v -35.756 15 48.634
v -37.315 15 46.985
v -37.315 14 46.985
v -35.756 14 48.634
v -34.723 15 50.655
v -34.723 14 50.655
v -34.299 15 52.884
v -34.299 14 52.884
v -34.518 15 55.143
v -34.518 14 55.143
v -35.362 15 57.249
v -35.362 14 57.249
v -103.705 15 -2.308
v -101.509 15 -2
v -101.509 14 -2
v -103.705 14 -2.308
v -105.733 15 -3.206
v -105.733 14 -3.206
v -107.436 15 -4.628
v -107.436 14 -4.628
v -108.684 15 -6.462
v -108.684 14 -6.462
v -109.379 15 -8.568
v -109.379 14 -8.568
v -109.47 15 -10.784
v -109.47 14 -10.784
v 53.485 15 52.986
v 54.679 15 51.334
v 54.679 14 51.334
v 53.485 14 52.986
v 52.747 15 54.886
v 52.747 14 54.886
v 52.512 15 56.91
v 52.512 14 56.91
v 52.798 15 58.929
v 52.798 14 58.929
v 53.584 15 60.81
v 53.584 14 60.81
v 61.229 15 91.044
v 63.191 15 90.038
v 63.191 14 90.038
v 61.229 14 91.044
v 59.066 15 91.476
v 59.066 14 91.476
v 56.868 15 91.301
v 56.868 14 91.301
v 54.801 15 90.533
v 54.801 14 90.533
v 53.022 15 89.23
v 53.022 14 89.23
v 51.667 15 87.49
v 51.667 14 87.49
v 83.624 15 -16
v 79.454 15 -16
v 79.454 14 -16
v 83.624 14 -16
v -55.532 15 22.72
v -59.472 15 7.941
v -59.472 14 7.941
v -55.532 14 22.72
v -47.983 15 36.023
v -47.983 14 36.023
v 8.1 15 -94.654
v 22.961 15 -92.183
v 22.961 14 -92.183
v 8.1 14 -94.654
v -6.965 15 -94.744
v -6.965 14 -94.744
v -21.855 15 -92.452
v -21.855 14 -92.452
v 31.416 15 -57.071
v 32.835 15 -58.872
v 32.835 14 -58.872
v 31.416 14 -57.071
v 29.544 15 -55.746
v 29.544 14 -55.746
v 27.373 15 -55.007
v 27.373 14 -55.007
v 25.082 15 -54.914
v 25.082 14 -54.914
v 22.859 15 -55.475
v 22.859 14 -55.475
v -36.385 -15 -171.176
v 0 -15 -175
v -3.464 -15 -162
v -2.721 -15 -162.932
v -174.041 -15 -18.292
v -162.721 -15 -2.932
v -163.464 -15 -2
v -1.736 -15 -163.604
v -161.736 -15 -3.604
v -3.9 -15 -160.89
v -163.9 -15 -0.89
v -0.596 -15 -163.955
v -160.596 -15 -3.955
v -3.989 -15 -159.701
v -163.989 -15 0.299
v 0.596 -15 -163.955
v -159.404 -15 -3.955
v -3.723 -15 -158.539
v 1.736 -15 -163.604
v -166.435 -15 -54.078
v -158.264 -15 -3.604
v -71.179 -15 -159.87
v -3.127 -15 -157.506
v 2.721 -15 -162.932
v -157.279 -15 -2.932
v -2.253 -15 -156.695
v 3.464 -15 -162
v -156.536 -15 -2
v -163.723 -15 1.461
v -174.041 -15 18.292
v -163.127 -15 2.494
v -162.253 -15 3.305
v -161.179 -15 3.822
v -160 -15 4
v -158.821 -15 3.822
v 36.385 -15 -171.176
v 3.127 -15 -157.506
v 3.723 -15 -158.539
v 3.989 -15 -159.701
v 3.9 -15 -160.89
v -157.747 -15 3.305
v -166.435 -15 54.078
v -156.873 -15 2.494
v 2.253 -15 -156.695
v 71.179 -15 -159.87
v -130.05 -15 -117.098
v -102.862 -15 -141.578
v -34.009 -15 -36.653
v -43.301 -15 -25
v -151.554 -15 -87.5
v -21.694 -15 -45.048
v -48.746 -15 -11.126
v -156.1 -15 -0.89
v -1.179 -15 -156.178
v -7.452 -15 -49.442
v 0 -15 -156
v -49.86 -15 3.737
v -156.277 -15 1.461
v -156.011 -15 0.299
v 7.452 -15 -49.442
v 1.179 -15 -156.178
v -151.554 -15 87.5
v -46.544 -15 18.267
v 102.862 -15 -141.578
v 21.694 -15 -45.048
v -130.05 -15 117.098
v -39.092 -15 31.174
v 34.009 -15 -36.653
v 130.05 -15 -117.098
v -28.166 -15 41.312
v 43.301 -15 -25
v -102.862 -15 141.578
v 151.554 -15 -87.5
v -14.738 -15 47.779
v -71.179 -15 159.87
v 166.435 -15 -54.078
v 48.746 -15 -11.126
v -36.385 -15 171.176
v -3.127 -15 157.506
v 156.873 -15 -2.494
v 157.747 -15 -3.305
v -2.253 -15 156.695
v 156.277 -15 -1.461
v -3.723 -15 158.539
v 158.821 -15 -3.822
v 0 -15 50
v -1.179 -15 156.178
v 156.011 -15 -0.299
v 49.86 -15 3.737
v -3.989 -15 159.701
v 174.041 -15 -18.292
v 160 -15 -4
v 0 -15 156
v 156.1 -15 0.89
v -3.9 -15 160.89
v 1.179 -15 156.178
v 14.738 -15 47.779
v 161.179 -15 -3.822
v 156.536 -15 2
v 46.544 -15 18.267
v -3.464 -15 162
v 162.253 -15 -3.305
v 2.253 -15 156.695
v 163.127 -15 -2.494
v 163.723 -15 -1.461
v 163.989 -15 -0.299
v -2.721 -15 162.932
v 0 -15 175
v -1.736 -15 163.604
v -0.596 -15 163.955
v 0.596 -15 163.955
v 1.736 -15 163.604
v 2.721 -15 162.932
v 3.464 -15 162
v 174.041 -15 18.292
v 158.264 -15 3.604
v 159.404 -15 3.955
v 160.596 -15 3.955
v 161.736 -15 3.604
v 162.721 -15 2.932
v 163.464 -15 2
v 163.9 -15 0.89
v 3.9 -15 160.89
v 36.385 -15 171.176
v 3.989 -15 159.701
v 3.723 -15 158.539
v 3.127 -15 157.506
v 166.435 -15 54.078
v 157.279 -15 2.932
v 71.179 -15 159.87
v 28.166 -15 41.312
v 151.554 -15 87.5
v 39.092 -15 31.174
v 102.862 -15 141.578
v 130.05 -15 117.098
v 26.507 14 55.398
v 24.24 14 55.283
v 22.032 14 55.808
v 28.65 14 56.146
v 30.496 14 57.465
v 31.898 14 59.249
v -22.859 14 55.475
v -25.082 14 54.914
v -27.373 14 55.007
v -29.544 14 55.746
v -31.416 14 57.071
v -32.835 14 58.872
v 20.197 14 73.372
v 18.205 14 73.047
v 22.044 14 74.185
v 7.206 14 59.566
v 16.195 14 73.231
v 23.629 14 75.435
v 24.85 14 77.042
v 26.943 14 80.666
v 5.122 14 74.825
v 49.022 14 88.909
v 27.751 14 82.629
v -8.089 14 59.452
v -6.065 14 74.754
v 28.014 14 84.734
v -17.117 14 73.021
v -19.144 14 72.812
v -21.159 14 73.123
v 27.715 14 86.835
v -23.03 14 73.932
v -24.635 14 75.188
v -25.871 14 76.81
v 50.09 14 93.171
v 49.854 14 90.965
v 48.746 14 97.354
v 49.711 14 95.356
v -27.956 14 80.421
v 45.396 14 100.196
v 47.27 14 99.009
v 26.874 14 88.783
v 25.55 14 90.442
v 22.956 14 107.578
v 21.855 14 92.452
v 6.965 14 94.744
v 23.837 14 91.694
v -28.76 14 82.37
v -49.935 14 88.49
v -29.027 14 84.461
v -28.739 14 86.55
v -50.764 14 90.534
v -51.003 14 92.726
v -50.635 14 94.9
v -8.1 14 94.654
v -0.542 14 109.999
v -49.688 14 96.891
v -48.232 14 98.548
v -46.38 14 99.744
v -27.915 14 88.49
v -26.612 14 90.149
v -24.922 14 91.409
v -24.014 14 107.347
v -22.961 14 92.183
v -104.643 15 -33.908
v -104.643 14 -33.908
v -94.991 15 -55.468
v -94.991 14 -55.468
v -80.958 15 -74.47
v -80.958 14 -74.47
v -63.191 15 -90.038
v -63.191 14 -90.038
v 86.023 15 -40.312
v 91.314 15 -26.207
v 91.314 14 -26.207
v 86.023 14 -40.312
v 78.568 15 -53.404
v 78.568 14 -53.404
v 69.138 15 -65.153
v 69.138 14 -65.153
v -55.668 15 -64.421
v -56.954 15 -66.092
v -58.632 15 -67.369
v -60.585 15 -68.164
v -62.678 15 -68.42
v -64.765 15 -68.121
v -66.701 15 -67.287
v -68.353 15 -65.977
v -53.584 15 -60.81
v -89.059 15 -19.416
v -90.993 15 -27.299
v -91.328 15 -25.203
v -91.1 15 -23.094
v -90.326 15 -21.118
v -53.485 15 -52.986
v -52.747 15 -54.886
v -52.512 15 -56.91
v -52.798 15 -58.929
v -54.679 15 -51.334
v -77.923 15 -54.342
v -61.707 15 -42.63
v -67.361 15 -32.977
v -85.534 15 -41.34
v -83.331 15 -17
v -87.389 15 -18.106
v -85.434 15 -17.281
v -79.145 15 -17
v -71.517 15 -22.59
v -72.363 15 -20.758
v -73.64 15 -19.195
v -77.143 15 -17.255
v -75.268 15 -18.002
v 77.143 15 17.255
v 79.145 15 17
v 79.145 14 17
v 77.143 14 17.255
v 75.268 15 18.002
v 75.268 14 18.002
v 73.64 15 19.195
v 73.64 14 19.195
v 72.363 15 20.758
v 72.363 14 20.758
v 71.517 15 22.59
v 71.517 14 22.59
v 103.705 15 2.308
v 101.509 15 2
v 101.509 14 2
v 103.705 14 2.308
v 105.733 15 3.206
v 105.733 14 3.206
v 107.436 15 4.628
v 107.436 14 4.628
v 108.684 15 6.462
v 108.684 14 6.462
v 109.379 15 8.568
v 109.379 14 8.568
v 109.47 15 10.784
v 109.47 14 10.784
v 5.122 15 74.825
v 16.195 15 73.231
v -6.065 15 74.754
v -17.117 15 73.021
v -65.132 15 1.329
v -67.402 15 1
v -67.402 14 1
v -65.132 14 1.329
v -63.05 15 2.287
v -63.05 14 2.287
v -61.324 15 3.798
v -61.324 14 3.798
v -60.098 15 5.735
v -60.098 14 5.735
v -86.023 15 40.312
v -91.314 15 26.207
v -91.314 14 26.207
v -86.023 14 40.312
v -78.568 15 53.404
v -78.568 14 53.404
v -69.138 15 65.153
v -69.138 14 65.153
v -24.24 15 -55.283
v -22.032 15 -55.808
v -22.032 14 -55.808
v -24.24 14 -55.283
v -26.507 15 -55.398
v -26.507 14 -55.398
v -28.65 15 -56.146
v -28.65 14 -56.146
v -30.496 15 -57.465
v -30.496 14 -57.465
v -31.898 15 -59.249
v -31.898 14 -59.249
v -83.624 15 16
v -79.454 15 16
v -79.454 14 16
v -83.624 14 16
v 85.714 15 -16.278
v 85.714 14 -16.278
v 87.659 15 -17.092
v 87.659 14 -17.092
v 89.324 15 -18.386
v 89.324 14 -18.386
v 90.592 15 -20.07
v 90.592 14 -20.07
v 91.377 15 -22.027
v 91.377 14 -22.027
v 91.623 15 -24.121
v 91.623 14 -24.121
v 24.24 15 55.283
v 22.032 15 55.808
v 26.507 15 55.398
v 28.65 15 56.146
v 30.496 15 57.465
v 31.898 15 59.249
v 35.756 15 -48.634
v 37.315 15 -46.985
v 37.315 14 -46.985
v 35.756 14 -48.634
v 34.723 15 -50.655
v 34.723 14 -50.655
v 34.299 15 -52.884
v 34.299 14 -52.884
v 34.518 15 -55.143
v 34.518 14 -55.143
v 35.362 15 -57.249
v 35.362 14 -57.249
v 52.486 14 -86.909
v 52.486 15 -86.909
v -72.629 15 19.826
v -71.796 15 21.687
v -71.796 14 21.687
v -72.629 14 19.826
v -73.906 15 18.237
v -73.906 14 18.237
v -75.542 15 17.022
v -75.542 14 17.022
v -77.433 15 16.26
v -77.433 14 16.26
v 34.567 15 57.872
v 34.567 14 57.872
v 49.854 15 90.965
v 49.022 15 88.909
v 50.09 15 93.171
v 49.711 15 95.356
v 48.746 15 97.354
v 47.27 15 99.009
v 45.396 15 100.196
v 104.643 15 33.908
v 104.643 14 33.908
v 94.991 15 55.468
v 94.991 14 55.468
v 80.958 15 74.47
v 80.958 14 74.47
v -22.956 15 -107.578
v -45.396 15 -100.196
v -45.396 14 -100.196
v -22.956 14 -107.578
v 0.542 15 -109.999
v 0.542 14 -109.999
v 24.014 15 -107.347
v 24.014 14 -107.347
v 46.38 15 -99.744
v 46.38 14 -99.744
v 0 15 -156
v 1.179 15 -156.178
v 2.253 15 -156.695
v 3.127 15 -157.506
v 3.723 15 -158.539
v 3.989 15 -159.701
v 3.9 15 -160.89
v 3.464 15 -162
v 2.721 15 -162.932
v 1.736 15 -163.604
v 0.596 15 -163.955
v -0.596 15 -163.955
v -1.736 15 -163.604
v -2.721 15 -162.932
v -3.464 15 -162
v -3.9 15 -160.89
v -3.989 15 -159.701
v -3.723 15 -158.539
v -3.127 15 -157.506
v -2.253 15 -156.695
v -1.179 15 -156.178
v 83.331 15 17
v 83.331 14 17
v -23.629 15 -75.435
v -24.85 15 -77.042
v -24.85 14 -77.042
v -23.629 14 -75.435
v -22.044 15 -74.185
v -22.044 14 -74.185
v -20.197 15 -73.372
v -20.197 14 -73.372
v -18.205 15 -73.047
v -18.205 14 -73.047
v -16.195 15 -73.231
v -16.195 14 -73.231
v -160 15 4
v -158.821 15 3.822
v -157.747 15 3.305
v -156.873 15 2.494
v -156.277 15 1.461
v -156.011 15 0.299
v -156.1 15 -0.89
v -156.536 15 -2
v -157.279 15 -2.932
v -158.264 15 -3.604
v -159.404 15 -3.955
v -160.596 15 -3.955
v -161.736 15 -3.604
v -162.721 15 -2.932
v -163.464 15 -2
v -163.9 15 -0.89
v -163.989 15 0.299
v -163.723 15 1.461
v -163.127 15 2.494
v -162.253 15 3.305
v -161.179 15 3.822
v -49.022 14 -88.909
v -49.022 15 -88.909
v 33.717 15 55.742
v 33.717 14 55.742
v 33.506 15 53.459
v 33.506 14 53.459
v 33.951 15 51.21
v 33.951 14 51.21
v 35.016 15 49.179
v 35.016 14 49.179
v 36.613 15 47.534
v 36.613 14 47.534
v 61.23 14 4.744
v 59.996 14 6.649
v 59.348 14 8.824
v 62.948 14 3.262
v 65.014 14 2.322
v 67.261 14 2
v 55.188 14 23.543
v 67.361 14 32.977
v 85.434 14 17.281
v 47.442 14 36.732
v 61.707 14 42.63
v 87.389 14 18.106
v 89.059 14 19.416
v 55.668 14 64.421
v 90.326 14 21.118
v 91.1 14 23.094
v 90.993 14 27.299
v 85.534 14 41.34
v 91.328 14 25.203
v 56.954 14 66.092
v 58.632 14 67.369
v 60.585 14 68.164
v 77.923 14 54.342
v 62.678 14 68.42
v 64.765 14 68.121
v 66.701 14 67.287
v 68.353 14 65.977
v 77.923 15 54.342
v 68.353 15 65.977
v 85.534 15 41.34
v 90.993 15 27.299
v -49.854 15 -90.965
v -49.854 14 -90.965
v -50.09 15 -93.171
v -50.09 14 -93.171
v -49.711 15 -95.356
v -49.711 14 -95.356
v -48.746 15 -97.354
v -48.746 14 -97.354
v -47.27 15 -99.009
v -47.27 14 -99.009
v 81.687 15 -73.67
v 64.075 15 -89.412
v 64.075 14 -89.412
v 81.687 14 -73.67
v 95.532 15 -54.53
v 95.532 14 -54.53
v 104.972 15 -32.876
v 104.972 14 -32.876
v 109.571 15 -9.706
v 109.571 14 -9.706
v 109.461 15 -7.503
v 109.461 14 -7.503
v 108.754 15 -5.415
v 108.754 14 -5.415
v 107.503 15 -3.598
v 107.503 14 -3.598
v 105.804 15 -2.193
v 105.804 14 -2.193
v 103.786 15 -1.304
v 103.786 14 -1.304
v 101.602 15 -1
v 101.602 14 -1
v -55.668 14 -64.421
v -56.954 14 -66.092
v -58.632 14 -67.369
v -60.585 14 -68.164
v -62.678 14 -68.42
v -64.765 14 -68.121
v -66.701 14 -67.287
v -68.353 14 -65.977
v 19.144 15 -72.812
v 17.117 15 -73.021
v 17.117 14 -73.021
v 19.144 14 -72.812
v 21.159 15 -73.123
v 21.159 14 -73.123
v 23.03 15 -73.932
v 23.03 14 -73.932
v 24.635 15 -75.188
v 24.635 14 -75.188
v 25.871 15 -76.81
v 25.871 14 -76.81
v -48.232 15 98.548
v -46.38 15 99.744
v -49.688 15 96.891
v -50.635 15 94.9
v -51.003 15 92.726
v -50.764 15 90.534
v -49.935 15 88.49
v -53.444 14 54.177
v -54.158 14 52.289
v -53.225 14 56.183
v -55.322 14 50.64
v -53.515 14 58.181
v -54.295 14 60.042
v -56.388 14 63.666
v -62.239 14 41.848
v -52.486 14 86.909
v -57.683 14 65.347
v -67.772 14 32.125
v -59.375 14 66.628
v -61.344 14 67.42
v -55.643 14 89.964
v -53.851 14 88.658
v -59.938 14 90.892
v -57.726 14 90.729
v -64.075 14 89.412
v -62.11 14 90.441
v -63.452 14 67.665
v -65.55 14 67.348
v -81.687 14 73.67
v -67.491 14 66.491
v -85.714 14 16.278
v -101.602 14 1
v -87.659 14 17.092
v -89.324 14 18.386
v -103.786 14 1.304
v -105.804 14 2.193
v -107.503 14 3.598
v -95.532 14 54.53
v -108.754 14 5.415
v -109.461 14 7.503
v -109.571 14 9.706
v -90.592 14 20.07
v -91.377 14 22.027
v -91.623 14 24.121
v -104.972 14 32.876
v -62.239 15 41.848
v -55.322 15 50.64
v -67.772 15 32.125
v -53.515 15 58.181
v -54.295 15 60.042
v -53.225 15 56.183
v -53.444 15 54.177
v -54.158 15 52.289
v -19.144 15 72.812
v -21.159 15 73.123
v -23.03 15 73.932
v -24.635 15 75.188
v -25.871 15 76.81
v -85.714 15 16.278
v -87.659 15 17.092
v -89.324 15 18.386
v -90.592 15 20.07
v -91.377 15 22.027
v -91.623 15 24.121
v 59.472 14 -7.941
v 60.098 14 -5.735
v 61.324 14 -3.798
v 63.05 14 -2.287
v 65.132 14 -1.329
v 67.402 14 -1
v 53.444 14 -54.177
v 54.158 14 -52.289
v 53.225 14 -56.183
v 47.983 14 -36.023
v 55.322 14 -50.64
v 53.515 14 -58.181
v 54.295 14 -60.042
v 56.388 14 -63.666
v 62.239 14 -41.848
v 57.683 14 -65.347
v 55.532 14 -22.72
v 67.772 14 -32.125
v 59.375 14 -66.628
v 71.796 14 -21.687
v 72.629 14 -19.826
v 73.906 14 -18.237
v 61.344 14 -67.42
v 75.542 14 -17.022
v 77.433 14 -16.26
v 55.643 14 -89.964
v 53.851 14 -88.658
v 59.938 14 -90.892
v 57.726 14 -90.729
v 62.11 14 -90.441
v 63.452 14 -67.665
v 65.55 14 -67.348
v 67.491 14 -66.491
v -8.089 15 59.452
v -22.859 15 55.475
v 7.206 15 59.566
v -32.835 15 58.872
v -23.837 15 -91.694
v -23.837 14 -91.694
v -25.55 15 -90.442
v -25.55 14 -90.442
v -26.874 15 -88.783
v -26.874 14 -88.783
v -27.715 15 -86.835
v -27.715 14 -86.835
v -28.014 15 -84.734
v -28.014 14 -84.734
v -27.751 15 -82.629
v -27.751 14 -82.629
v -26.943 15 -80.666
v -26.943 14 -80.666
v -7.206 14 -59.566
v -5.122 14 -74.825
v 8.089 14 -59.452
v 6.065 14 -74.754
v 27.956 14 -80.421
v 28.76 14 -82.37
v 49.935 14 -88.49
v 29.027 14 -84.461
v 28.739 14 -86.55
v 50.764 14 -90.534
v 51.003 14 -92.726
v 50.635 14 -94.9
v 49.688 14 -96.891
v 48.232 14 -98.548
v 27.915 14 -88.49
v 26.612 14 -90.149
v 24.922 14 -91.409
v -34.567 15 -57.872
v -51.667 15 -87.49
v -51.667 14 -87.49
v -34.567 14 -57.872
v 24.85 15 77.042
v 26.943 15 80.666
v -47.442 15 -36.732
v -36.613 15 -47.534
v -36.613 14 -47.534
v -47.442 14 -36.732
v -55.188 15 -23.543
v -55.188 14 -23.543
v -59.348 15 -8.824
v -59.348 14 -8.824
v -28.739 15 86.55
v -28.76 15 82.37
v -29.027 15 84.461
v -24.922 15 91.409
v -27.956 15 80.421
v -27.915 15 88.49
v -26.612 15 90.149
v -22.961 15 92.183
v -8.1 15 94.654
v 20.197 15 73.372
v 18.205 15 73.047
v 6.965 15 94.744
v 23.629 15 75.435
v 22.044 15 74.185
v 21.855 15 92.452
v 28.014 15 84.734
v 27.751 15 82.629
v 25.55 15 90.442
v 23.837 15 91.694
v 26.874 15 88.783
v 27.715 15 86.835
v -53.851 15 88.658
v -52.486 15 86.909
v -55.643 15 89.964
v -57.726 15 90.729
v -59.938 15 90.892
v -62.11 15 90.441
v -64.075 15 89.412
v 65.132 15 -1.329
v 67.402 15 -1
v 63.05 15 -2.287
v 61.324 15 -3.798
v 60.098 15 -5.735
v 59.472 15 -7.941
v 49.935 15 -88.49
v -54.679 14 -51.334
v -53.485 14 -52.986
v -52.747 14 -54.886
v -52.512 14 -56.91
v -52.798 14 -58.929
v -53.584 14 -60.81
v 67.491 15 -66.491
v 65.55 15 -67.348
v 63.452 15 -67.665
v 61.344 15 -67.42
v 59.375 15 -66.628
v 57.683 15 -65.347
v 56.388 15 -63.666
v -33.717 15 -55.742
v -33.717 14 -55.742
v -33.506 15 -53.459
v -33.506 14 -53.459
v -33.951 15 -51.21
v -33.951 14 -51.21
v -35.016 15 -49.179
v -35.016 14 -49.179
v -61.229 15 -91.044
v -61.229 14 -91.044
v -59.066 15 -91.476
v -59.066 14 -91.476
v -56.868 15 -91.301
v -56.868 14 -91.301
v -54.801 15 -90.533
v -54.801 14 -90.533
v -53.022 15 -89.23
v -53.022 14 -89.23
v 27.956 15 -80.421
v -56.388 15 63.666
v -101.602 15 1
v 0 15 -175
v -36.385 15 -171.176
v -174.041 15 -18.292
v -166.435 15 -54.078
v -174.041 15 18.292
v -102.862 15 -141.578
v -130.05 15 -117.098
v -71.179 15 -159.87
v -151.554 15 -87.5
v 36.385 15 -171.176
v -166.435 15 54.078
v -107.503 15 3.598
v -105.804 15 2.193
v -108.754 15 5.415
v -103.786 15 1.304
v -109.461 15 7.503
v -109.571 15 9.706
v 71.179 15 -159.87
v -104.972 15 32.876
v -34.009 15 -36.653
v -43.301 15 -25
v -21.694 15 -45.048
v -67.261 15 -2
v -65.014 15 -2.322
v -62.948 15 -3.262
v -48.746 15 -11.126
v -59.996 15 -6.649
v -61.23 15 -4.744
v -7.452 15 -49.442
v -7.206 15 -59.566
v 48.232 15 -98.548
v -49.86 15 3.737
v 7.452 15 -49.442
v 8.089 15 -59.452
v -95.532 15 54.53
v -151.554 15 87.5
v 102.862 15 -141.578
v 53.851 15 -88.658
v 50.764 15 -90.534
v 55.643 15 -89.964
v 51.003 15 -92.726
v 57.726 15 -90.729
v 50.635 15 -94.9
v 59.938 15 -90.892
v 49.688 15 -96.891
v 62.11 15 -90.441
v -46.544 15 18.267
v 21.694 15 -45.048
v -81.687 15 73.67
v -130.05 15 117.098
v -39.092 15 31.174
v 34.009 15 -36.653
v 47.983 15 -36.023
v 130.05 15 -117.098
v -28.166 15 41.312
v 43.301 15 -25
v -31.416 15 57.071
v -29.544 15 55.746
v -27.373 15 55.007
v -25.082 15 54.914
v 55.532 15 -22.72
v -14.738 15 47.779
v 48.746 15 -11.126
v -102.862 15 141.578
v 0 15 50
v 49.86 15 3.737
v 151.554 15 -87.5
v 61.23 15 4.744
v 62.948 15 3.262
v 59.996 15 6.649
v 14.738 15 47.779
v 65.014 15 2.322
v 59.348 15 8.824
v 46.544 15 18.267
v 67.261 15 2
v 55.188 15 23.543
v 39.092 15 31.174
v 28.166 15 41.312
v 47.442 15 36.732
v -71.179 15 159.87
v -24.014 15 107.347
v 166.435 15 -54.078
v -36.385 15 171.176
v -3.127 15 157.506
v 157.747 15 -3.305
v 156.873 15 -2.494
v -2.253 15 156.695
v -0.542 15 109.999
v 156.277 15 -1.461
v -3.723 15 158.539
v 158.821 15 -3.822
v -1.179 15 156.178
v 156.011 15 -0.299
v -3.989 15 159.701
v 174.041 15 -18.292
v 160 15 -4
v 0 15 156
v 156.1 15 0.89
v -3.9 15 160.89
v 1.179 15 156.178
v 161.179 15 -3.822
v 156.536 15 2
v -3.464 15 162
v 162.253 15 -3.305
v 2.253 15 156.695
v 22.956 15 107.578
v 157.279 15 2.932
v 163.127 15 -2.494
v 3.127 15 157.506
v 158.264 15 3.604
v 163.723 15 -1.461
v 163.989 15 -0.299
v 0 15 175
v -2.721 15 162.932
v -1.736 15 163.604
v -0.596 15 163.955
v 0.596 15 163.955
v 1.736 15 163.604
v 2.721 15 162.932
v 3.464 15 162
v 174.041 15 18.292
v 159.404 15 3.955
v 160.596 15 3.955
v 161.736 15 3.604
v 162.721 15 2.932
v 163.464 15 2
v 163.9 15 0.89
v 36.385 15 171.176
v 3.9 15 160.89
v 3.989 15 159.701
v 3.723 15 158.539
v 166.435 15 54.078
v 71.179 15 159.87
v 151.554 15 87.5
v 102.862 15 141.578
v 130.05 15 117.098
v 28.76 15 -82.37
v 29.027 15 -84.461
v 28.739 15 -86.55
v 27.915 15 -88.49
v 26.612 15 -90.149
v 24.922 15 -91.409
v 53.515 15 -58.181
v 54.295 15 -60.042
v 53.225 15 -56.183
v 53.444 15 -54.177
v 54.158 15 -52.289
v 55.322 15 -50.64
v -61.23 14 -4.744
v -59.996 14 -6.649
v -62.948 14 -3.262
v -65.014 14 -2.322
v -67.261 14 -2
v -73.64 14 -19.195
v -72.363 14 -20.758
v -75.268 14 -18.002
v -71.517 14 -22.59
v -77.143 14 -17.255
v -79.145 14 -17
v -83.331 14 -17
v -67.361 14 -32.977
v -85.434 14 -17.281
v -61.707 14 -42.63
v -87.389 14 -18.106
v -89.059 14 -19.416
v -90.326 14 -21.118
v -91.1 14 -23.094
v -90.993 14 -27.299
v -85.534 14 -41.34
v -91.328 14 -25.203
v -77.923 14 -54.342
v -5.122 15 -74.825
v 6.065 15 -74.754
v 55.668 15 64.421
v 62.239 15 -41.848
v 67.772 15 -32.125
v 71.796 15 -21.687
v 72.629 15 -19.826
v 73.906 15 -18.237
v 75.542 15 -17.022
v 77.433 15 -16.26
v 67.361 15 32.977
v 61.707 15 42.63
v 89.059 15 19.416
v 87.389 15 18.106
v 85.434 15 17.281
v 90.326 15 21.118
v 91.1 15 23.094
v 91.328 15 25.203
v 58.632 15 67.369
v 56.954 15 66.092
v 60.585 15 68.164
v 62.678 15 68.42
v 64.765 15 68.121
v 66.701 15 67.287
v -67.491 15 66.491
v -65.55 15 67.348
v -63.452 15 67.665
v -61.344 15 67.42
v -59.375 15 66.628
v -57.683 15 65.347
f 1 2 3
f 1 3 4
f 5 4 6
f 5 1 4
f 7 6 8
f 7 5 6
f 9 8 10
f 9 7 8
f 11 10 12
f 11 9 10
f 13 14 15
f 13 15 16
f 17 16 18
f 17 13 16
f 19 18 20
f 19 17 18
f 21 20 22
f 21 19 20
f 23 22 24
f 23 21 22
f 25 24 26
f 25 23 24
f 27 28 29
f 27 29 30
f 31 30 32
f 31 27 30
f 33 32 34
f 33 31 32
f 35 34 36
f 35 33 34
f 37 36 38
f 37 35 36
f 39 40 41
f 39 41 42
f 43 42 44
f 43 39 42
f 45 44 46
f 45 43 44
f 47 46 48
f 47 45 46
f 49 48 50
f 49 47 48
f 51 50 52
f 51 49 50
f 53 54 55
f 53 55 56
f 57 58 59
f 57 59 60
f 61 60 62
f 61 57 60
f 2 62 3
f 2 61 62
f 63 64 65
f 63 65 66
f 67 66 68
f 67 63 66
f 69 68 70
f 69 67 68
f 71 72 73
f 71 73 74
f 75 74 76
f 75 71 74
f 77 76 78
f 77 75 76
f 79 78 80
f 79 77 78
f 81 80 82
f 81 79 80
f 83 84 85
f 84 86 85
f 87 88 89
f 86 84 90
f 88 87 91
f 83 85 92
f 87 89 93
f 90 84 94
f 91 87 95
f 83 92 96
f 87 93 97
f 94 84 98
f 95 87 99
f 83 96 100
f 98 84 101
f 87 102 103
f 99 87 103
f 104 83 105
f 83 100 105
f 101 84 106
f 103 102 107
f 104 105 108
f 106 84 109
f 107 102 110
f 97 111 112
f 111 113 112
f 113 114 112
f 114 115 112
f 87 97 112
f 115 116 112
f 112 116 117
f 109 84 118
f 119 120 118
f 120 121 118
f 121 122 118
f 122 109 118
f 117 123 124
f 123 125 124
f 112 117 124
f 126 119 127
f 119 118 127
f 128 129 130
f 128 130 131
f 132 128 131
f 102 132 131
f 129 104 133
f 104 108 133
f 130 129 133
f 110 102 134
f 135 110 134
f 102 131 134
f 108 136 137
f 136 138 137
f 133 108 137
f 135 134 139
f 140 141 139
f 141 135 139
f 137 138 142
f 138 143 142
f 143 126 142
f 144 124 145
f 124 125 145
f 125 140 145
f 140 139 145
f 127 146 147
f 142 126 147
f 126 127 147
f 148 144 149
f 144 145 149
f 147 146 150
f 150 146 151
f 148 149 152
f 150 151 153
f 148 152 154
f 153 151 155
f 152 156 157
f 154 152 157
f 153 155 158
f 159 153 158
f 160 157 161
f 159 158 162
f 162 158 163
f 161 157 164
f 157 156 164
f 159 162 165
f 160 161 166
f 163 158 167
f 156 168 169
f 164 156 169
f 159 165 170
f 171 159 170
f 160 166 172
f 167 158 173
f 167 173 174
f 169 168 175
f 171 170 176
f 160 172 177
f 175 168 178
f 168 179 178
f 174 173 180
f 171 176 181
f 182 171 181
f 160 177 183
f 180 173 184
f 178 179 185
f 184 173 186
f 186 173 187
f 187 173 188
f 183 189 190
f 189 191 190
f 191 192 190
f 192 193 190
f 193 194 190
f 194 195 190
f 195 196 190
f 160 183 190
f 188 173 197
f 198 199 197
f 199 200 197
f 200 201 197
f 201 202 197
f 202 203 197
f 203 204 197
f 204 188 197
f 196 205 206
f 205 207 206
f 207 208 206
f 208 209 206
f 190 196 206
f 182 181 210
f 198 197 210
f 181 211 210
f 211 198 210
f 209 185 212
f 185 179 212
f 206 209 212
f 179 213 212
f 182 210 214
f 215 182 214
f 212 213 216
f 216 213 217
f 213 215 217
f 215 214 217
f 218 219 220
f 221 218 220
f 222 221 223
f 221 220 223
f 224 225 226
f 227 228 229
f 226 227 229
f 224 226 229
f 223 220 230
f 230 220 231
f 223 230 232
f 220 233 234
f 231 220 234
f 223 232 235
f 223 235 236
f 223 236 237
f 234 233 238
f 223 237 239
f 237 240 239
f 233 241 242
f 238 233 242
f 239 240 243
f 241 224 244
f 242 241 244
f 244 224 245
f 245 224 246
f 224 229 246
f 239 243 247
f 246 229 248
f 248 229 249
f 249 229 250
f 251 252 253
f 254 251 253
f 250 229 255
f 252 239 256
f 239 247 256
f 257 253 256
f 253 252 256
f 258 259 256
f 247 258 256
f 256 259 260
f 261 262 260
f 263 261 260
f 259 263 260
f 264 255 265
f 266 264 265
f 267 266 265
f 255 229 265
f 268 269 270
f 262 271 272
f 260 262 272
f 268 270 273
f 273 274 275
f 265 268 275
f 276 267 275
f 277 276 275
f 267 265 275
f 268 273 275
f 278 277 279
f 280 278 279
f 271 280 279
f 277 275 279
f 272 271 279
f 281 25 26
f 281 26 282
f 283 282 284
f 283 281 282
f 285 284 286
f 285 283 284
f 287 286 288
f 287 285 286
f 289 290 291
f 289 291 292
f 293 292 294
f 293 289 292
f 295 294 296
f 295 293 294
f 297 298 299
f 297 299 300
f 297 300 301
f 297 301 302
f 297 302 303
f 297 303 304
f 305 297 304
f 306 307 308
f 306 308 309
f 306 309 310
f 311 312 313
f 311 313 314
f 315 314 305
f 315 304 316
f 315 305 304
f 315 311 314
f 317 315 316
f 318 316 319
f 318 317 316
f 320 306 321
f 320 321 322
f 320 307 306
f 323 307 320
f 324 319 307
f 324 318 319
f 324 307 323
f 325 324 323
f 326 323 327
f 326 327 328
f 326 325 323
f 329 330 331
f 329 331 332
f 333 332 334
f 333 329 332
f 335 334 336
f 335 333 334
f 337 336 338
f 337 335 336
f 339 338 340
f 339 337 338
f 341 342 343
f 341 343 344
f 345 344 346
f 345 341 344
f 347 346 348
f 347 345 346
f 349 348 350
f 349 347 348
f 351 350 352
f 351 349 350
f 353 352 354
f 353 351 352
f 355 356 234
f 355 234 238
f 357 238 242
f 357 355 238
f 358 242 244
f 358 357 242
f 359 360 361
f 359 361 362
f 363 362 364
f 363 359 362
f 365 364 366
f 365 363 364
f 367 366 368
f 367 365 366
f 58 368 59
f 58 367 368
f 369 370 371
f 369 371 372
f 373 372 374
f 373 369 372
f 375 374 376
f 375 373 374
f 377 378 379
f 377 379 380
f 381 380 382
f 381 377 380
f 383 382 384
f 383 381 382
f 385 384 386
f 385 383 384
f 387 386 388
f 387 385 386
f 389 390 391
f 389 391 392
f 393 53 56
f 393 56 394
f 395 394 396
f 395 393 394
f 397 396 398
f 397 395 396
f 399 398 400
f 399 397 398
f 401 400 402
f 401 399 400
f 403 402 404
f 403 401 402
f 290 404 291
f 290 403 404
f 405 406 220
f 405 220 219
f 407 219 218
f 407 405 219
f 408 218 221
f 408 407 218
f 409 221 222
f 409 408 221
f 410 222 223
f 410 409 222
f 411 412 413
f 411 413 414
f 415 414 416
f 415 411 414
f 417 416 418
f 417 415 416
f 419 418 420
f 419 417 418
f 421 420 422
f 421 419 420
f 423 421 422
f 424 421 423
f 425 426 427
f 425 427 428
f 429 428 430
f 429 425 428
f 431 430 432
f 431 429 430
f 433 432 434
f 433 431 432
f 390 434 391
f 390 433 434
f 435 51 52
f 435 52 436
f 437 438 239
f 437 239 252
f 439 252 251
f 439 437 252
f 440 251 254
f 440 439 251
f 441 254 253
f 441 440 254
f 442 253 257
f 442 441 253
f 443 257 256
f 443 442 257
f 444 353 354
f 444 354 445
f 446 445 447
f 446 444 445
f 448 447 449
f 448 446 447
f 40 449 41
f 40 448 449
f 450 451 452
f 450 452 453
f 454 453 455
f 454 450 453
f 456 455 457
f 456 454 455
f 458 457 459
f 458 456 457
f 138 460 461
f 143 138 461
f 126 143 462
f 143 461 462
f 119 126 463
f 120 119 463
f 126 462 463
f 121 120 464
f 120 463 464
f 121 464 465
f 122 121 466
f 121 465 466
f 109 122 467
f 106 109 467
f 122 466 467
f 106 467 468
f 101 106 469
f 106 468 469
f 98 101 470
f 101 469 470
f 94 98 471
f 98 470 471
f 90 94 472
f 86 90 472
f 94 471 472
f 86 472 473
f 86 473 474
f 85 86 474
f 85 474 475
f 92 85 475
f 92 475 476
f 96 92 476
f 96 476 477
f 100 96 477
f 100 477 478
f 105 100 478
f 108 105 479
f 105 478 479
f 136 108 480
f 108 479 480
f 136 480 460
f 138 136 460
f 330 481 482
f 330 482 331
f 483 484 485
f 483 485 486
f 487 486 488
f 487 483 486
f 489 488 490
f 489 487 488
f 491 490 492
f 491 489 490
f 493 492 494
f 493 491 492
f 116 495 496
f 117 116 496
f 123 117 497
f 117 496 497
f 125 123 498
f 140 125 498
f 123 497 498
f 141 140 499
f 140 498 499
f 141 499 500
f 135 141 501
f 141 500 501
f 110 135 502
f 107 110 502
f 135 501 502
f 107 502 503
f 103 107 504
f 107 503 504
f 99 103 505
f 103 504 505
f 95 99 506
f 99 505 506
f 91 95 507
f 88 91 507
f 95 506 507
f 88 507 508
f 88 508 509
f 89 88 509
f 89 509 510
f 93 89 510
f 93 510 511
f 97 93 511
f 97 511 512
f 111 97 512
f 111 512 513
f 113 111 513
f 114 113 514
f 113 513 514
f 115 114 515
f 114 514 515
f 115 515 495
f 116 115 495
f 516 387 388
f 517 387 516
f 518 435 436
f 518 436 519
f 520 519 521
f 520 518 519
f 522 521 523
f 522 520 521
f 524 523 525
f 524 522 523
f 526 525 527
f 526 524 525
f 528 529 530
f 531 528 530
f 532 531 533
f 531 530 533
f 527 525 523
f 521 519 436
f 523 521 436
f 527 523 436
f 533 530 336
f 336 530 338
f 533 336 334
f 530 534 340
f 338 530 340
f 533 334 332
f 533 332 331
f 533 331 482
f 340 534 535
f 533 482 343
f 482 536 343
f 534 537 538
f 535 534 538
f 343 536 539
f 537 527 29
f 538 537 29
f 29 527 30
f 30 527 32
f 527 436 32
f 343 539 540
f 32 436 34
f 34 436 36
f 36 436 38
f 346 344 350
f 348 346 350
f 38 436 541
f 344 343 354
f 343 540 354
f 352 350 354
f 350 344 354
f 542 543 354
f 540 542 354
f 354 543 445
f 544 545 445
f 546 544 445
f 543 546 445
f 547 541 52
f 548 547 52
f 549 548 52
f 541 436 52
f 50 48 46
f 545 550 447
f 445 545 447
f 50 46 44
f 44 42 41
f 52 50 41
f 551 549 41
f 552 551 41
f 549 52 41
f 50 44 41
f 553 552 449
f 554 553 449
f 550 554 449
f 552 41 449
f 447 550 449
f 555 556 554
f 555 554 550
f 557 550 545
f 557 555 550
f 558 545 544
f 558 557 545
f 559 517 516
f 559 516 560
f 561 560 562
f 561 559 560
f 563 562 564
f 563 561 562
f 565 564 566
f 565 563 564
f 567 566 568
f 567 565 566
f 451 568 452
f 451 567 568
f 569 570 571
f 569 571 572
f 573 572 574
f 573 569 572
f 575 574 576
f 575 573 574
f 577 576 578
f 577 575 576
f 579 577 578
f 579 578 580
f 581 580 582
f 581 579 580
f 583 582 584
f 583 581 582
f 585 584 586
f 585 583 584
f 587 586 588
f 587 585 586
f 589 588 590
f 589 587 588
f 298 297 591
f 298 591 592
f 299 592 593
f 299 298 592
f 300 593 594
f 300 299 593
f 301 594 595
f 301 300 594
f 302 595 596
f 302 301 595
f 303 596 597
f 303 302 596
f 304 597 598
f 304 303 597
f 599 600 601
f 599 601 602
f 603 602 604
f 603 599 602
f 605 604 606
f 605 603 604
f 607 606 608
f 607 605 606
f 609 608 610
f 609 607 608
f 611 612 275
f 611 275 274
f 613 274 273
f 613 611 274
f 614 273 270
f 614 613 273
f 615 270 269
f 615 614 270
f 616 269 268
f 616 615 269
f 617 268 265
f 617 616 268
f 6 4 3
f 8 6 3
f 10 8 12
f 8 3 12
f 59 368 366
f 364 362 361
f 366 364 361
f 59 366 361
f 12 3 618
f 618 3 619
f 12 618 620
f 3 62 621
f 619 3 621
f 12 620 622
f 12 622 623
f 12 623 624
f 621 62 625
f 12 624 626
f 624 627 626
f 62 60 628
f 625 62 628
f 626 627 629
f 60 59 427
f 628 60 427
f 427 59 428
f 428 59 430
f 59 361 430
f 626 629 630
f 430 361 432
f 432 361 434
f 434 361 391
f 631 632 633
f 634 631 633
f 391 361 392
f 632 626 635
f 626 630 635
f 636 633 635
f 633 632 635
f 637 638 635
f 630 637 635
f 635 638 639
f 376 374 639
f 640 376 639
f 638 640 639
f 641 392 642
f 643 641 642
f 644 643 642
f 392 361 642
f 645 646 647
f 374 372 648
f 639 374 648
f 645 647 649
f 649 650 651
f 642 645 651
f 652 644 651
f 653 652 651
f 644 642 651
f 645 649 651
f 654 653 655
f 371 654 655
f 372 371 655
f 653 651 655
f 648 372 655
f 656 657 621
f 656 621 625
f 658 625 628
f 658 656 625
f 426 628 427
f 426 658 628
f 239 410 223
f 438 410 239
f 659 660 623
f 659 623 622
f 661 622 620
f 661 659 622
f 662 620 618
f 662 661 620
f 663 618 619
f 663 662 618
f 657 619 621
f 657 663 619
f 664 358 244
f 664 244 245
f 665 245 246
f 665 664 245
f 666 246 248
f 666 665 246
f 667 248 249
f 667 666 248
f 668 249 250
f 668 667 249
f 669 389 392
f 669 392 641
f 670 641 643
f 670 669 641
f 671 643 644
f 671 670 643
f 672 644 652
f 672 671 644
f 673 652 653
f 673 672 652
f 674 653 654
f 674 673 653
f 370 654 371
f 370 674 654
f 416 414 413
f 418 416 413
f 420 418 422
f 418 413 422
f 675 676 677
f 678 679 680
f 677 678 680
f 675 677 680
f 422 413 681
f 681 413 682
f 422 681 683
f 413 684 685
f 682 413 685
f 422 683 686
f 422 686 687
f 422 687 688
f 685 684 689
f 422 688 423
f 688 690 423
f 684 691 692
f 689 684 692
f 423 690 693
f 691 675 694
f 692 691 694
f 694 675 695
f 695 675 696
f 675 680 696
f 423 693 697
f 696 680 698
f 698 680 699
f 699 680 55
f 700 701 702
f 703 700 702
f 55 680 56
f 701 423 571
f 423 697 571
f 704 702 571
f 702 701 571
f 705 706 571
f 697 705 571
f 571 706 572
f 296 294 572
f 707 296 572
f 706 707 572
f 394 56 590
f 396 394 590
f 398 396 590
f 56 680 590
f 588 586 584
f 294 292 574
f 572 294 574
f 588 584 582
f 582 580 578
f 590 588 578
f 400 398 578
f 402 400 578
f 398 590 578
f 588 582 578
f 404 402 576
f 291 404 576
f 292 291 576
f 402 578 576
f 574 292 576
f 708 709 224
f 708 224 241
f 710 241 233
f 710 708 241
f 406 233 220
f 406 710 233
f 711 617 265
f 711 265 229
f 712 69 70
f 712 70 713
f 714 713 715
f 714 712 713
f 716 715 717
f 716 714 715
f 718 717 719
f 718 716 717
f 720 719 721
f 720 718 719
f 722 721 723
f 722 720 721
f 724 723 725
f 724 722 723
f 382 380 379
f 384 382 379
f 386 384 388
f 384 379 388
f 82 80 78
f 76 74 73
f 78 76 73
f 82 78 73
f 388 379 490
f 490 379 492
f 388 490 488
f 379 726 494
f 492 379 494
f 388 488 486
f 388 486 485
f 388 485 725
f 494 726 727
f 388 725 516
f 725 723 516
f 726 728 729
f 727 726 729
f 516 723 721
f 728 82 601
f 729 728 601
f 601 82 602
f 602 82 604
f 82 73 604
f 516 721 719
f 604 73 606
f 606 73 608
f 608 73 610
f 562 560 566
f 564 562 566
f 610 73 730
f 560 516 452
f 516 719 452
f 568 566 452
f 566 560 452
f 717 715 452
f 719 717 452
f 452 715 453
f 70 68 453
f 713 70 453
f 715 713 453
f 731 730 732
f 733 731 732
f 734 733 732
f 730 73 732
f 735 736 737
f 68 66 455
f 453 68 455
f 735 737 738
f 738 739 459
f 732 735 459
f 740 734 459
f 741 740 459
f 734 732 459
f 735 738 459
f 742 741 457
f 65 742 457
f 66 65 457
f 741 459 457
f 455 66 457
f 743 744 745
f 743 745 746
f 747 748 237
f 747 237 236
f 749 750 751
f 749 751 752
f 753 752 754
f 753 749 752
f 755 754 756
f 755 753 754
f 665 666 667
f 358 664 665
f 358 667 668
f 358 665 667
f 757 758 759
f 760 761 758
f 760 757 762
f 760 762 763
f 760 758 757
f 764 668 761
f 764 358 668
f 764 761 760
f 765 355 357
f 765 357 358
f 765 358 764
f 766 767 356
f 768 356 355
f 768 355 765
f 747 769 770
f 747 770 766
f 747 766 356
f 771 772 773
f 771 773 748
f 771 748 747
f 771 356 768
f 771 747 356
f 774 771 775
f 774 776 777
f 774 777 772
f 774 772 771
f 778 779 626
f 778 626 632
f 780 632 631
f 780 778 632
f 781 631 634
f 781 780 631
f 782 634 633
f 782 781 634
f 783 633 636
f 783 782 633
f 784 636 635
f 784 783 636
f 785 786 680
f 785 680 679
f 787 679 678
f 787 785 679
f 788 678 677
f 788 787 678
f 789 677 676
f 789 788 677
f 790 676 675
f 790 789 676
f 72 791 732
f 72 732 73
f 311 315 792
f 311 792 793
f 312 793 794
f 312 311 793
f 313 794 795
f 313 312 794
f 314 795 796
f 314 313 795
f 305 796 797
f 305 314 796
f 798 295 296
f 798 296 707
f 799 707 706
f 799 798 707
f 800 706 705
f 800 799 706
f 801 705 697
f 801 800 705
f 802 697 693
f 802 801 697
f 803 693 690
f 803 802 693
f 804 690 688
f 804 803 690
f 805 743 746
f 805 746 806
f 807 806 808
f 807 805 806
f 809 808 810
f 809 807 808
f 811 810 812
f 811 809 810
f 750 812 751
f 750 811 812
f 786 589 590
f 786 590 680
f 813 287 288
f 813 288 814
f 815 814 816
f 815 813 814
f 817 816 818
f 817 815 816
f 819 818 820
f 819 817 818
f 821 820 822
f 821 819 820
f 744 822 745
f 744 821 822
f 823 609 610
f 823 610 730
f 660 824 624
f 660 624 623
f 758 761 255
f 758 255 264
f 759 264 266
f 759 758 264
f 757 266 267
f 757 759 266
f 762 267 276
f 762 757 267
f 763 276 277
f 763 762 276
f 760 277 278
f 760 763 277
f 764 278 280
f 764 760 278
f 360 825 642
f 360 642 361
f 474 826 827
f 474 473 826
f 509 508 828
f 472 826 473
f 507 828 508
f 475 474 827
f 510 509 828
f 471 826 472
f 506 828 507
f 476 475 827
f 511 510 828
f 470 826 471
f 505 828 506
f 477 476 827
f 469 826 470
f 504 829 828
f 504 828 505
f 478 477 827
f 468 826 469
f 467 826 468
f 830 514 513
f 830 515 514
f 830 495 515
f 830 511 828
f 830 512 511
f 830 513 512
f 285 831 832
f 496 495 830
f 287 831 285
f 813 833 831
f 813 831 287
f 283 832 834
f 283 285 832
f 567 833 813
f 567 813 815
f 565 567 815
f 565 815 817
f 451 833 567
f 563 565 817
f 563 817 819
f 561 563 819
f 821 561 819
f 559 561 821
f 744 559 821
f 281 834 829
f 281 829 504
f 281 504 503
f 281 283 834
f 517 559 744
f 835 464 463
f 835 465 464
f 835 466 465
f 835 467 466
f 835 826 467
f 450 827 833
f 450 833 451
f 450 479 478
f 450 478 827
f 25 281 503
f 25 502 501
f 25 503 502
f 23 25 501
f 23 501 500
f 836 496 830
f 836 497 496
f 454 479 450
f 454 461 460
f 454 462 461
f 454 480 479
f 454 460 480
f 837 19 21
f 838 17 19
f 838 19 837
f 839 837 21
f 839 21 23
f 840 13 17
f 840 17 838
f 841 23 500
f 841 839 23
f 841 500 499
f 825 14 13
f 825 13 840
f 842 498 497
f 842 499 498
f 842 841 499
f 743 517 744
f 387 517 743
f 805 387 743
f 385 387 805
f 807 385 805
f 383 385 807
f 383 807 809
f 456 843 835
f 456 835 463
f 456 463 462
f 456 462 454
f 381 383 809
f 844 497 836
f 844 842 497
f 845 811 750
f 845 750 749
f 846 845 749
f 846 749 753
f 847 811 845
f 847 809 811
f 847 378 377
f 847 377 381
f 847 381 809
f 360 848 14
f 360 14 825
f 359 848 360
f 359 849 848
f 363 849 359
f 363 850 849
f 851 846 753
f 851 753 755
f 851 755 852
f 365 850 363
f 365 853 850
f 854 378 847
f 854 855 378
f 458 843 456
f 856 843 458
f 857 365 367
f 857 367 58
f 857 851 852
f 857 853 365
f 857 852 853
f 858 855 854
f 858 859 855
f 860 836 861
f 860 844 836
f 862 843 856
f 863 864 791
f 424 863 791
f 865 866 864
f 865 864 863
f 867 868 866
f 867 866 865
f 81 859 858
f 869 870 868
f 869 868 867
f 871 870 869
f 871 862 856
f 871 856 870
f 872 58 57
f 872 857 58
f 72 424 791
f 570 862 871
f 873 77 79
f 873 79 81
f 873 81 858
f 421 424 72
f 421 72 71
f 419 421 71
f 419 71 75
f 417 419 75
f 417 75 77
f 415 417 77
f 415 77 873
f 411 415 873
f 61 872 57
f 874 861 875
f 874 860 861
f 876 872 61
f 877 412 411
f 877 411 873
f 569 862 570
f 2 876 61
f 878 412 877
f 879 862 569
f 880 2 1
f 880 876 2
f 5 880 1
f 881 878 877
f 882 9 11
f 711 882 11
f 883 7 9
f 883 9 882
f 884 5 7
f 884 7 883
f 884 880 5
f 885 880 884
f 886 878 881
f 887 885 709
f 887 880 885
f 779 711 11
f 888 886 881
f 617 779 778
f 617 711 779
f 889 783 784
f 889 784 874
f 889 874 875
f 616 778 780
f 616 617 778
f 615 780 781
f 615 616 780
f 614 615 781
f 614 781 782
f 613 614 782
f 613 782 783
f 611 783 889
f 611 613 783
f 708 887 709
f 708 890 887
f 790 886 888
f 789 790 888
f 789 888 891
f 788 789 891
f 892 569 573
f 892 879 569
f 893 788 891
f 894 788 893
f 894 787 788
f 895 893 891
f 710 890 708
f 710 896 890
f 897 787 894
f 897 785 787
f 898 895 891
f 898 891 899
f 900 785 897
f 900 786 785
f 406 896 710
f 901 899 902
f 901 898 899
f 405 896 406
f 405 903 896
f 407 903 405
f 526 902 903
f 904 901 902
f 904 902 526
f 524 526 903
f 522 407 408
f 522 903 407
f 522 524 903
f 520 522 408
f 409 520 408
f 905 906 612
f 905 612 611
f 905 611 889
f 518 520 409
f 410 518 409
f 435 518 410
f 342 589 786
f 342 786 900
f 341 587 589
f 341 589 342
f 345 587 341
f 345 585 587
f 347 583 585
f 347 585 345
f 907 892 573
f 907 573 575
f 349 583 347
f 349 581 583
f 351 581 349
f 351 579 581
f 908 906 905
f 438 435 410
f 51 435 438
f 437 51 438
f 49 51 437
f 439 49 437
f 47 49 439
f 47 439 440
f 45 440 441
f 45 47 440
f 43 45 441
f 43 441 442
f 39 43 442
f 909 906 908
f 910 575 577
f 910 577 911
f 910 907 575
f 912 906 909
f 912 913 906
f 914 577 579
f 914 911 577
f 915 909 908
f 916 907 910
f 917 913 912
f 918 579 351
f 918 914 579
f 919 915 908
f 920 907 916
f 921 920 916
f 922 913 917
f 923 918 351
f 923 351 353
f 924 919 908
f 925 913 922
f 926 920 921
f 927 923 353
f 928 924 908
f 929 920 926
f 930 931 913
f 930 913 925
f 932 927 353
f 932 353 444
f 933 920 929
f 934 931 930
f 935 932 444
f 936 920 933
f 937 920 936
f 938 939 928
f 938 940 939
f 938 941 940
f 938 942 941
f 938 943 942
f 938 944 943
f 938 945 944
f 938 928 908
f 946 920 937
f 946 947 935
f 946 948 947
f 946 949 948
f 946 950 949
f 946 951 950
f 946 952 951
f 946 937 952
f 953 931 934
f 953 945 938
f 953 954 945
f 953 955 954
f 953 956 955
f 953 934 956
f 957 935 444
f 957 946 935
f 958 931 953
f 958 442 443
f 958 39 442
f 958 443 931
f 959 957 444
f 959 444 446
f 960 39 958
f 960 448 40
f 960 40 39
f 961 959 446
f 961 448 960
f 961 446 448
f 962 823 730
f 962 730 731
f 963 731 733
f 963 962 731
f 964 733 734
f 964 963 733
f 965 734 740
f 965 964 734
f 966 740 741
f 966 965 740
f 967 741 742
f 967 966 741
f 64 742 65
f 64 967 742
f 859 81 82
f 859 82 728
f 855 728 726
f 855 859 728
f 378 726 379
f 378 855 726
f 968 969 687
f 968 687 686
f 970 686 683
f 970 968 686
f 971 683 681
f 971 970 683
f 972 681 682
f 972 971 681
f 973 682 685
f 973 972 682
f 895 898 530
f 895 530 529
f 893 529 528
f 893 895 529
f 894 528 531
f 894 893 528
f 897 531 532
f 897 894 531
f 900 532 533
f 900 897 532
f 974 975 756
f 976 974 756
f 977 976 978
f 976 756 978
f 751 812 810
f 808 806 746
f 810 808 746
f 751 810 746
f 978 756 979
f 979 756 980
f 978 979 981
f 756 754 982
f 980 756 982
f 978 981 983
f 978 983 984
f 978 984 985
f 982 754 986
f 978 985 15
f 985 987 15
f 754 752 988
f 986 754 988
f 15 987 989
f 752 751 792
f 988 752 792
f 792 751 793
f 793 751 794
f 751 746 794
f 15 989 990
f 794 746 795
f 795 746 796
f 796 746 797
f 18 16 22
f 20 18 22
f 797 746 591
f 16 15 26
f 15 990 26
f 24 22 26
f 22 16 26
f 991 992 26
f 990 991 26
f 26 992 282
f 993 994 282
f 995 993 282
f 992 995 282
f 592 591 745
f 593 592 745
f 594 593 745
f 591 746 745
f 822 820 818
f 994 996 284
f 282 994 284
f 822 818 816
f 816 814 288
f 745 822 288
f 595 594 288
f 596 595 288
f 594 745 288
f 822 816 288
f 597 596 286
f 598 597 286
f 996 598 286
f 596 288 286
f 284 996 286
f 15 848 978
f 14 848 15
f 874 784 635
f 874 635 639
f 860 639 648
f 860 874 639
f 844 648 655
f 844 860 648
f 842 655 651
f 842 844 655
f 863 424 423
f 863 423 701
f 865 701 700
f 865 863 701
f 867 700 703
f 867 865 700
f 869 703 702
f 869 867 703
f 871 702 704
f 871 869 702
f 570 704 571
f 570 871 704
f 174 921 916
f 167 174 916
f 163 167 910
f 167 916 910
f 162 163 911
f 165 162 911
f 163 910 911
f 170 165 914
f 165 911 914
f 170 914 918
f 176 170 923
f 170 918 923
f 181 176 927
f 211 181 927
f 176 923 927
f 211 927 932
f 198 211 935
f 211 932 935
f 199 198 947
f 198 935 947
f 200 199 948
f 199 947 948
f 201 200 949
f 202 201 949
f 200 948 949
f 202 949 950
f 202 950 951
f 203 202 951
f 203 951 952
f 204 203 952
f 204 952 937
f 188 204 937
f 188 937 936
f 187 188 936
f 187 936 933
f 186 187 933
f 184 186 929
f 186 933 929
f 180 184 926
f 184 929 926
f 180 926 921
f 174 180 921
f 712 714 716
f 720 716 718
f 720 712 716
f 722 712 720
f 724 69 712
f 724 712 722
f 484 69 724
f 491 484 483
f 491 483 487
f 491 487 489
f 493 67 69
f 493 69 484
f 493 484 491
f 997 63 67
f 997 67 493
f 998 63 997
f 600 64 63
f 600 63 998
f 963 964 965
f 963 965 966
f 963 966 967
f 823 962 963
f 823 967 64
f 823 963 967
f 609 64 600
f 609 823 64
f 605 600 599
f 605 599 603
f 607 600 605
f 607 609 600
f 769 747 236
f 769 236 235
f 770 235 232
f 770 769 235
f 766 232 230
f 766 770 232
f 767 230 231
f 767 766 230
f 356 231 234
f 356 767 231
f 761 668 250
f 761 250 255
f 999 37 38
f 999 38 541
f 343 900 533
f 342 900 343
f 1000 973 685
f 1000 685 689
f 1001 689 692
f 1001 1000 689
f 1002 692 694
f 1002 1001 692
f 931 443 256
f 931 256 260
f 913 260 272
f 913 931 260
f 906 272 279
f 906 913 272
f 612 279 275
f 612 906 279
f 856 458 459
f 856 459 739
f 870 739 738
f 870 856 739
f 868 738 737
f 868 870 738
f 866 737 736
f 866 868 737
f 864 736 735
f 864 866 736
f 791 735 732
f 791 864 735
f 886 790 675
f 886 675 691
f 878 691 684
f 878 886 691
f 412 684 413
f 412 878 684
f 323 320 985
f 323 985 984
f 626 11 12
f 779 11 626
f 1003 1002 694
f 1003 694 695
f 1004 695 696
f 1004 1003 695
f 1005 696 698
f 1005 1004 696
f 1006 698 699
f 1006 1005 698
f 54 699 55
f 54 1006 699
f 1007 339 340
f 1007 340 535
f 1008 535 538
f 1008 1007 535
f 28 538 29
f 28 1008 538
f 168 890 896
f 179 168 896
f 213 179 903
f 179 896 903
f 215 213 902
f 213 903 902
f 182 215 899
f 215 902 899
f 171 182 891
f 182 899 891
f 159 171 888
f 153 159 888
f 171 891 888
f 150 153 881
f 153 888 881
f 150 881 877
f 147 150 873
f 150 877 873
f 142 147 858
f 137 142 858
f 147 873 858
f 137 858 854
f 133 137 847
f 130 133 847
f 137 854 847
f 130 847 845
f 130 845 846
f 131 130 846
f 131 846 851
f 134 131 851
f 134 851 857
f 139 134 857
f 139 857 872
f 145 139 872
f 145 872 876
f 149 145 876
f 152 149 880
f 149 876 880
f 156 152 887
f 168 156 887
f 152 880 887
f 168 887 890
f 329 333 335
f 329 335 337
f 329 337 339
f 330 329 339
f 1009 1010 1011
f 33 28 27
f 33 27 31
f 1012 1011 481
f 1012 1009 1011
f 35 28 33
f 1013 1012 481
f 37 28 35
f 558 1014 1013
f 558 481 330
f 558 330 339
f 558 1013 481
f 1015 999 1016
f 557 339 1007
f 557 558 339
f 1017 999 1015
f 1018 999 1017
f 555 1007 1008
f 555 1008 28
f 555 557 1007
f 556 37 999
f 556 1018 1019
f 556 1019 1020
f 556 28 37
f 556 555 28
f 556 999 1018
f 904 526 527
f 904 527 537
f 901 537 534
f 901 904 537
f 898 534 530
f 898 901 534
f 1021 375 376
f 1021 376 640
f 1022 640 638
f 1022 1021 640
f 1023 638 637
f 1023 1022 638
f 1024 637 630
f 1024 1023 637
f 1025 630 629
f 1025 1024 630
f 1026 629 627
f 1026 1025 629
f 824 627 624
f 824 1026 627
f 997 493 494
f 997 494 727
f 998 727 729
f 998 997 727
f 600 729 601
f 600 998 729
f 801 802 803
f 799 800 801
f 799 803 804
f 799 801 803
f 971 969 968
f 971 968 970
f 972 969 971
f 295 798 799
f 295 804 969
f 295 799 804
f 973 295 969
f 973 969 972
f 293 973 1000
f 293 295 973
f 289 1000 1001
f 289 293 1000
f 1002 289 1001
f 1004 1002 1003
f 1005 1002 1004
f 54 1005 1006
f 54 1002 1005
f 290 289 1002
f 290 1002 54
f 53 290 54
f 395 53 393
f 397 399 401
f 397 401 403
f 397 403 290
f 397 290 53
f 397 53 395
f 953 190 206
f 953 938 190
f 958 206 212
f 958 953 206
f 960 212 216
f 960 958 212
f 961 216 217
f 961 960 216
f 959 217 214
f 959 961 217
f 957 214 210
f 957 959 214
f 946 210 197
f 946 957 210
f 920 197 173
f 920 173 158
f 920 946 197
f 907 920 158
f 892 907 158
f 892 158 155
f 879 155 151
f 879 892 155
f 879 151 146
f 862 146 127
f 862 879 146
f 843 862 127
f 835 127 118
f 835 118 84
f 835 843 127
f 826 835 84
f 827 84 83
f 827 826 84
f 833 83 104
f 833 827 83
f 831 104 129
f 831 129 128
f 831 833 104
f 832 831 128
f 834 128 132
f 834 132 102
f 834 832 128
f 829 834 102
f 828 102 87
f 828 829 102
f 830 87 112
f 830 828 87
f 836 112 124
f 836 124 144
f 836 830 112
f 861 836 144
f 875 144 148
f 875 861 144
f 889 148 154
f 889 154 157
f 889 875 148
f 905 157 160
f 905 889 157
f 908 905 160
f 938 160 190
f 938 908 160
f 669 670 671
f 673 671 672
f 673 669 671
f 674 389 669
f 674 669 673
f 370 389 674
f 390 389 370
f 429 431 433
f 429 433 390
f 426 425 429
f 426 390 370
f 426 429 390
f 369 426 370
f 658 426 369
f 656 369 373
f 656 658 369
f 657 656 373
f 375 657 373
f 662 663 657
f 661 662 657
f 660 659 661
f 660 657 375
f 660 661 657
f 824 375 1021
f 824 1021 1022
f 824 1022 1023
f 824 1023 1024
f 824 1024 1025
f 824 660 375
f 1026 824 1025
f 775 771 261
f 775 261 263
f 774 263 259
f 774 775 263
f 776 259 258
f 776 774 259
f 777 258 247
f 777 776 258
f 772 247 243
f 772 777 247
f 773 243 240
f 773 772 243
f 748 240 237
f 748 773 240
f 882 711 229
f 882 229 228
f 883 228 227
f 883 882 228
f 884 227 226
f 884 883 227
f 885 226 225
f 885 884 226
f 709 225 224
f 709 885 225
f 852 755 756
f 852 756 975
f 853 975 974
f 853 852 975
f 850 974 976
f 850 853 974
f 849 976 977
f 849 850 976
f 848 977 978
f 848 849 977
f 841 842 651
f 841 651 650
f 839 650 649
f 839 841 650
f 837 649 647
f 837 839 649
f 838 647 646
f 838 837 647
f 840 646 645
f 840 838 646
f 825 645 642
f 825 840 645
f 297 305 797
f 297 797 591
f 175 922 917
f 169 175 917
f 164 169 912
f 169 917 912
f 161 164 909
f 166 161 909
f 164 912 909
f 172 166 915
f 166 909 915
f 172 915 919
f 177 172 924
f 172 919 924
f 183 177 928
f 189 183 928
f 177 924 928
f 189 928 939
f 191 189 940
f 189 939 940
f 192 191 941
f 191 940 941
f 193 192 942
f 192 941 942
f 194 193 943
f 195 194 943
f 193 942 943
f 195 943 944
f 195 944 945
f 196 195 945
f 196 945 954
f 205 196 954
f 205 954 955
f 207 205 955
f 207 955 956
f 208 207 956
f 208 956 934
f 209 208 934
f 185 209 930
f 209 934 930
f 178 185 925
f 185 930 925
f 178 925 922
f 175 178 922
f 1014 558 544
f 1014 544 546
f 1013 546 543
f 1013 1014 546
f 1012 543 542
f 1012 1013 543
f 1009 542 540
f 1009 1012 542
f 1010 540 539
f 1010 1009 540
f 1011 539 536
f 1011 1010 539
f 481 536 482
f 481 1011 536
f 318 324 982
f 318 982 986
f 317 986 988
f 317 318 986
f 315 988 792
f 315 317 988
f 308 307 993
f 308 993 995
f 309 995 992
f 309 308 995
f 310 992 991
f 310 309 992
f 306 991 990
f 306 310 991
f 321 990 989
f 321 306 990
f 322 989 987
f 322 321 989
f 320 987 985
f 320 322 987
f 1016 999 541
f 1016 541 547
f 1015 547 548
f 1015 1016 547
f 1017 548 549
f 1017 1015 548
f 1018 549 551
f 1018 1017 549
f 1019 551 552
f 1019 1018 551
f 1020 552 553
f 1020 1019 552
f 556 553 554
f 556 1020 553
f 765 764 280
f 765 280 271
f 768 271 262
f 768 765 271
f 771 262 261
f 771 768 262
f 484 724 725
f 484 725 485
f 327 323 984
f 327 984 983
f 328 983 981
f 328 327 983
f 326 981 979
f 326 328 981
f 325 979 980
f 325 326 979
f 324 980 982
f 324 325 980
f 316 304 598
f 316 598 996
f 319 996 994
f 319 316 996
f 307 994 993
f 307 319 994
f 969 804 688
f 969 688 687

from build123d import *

# Parameters (mm, degrees)
SKETCH2_R           = 175
BOSS_EXTRUDE1_DEPTH = 15
SKETCH3_R           = 4
SKETCH3_R_2         = 50
CUT_EXTRUDE1_DEPTH  = 30
CUT_EXTRUDE3_DEPTH  = 1
CIRPATTERN2_COUNT   = 6


with BuildPart() as part:
    # Sketch2 → Boss-Extrude1 (new, symmetric)
    with BuildSketch(Plane(origin=(0, 0, 0), x_dir=(1, 0, 0), z_dir=(0, 1, 0))):
        with Locations(Location((0, 0, 0), (0, 0, 270))):
            Circle(SKETCH2_R)
    extrude(amount=BOSS_EXTRUDE1_DEPTH, both=True)

    # Sketch3 → Cut-Extrude1 (cut)
    with BuildSketch(Plane(origin=(0, 15, 0), x_dir=(1, 0, 0), z_dir=(0, 1, 0))):
        with Locations(Location((0, 160, 0), (0, 0, 270))):
            Circle(SKETCH3_R)
        with Locations(Location((0, -160, 0), (0, 0, 90))):
            Circle(SKETCH3_R)
        with Locations(Location((-160, 0, 0), (0, 0, 270))):
            Circle(SKETCH3_R)
        with Locations(Location((160, 0, 0), (0, 0, 90))):
            Circle(SKETCH3_R)
        with Locations(Location((0, 0, 0), (0, 0, 270))):
            Circle(SKETCH3_R_2)
    extrude(amount=-CUT_EXTRUDE1_DEPTH, mode=Mode.SUBTRACT)

    # Sketch4 → Cut-Extrude3 (cut)
    with BuildSketch(Plane(origin=(0, 15, 0), x_dir=(1, 0, 0), z_dir=(0, 1, 0))):
        with BuildLine():
            ThreePointArc((-36.613340144, 47.533812423), (-51.737318493, 30.385027154), (-59.347664897, 8.823529412))
            ThreePointArc((-59.347664897, 8.823529412), (-62.036309634, 3.941462028), (-67.260686883, 2))
            Line((-67.260686883, 2), (-101.508620324, 2))
            ThreePointArc((-101.508620324, 2), (-107.436288913, 4.627594105), (-109.470080741, 10.784313725))
            ThreePointArc((-109.470080741, 10.784313725), (-94.99085495, 55.468346611), (-63.19102199, 90.038295963))
            ThreePointArc((-63.19102199, 90.038295963), (-56.868026794, 91.301361412), (-51.667108069, 87.490056256))
            Line((-51.667108069, 87.490056256), (-34.5669156, 57.87165408))
            ThreePointArc((-34.5669156, 57.87165408), (-33.647401917, 52.31816148), (-36.613340144, 47.533812423))
        make_face()
        with BuildLine():
            ThreePointArc((-55.668486055, 64.420646227), (-61.622662682, 68.361129347), (-68.352706691, 65.97656772))
            ThreePointArc((-68.352706691, 65.97656772), (-81.986434608, 47.991921614), (-90.993256658, 27.298850575))
            ThreePointArc((-90.993256658, 27.298850575), (-89.749031081, 20.224584028), (-83.330666624, 17))
            Line((-83.330666624, 17), (-79.14543575, 17))
            ThreePointArc((-79.14543575, 17), (-74.41664671, 18.547205705), (-71.516960015, 22.590361446))
            ThreePointArc((-71.516960015, 22.590361446), (-64.714174788, 37.908779742), (-54.679341331, 51.333903335))
            ThreePointArc((-54.679341331, 51.333903335), (-52.564762349, 55.890540621), (-53.583601177, 60.80951969))
            Line((-53.583601177, 60.80951969), (-55.668486055, 64.420646227))
        make_face(mode=Mode.SUBTRACT)
    cut_extrude3 = extrude(amount=-CUT_EXTRUDE3_DEPTH, mode=Mode.SUBTRACT)

    # CirPattern2: Cut-Extrude3 ×6 about axis
    cirpattern2_axis = Axis((0, 0, 0), (0, 1, 0))
    for i in range(1, CIRPATTERN2_COUNT):
        add(cut_extrude3.rotate(cirpattern2_axis, i * 360 / CIRPATTERN2_COUNT), mode=Mode.SUBTRACT)


solid = part.part
